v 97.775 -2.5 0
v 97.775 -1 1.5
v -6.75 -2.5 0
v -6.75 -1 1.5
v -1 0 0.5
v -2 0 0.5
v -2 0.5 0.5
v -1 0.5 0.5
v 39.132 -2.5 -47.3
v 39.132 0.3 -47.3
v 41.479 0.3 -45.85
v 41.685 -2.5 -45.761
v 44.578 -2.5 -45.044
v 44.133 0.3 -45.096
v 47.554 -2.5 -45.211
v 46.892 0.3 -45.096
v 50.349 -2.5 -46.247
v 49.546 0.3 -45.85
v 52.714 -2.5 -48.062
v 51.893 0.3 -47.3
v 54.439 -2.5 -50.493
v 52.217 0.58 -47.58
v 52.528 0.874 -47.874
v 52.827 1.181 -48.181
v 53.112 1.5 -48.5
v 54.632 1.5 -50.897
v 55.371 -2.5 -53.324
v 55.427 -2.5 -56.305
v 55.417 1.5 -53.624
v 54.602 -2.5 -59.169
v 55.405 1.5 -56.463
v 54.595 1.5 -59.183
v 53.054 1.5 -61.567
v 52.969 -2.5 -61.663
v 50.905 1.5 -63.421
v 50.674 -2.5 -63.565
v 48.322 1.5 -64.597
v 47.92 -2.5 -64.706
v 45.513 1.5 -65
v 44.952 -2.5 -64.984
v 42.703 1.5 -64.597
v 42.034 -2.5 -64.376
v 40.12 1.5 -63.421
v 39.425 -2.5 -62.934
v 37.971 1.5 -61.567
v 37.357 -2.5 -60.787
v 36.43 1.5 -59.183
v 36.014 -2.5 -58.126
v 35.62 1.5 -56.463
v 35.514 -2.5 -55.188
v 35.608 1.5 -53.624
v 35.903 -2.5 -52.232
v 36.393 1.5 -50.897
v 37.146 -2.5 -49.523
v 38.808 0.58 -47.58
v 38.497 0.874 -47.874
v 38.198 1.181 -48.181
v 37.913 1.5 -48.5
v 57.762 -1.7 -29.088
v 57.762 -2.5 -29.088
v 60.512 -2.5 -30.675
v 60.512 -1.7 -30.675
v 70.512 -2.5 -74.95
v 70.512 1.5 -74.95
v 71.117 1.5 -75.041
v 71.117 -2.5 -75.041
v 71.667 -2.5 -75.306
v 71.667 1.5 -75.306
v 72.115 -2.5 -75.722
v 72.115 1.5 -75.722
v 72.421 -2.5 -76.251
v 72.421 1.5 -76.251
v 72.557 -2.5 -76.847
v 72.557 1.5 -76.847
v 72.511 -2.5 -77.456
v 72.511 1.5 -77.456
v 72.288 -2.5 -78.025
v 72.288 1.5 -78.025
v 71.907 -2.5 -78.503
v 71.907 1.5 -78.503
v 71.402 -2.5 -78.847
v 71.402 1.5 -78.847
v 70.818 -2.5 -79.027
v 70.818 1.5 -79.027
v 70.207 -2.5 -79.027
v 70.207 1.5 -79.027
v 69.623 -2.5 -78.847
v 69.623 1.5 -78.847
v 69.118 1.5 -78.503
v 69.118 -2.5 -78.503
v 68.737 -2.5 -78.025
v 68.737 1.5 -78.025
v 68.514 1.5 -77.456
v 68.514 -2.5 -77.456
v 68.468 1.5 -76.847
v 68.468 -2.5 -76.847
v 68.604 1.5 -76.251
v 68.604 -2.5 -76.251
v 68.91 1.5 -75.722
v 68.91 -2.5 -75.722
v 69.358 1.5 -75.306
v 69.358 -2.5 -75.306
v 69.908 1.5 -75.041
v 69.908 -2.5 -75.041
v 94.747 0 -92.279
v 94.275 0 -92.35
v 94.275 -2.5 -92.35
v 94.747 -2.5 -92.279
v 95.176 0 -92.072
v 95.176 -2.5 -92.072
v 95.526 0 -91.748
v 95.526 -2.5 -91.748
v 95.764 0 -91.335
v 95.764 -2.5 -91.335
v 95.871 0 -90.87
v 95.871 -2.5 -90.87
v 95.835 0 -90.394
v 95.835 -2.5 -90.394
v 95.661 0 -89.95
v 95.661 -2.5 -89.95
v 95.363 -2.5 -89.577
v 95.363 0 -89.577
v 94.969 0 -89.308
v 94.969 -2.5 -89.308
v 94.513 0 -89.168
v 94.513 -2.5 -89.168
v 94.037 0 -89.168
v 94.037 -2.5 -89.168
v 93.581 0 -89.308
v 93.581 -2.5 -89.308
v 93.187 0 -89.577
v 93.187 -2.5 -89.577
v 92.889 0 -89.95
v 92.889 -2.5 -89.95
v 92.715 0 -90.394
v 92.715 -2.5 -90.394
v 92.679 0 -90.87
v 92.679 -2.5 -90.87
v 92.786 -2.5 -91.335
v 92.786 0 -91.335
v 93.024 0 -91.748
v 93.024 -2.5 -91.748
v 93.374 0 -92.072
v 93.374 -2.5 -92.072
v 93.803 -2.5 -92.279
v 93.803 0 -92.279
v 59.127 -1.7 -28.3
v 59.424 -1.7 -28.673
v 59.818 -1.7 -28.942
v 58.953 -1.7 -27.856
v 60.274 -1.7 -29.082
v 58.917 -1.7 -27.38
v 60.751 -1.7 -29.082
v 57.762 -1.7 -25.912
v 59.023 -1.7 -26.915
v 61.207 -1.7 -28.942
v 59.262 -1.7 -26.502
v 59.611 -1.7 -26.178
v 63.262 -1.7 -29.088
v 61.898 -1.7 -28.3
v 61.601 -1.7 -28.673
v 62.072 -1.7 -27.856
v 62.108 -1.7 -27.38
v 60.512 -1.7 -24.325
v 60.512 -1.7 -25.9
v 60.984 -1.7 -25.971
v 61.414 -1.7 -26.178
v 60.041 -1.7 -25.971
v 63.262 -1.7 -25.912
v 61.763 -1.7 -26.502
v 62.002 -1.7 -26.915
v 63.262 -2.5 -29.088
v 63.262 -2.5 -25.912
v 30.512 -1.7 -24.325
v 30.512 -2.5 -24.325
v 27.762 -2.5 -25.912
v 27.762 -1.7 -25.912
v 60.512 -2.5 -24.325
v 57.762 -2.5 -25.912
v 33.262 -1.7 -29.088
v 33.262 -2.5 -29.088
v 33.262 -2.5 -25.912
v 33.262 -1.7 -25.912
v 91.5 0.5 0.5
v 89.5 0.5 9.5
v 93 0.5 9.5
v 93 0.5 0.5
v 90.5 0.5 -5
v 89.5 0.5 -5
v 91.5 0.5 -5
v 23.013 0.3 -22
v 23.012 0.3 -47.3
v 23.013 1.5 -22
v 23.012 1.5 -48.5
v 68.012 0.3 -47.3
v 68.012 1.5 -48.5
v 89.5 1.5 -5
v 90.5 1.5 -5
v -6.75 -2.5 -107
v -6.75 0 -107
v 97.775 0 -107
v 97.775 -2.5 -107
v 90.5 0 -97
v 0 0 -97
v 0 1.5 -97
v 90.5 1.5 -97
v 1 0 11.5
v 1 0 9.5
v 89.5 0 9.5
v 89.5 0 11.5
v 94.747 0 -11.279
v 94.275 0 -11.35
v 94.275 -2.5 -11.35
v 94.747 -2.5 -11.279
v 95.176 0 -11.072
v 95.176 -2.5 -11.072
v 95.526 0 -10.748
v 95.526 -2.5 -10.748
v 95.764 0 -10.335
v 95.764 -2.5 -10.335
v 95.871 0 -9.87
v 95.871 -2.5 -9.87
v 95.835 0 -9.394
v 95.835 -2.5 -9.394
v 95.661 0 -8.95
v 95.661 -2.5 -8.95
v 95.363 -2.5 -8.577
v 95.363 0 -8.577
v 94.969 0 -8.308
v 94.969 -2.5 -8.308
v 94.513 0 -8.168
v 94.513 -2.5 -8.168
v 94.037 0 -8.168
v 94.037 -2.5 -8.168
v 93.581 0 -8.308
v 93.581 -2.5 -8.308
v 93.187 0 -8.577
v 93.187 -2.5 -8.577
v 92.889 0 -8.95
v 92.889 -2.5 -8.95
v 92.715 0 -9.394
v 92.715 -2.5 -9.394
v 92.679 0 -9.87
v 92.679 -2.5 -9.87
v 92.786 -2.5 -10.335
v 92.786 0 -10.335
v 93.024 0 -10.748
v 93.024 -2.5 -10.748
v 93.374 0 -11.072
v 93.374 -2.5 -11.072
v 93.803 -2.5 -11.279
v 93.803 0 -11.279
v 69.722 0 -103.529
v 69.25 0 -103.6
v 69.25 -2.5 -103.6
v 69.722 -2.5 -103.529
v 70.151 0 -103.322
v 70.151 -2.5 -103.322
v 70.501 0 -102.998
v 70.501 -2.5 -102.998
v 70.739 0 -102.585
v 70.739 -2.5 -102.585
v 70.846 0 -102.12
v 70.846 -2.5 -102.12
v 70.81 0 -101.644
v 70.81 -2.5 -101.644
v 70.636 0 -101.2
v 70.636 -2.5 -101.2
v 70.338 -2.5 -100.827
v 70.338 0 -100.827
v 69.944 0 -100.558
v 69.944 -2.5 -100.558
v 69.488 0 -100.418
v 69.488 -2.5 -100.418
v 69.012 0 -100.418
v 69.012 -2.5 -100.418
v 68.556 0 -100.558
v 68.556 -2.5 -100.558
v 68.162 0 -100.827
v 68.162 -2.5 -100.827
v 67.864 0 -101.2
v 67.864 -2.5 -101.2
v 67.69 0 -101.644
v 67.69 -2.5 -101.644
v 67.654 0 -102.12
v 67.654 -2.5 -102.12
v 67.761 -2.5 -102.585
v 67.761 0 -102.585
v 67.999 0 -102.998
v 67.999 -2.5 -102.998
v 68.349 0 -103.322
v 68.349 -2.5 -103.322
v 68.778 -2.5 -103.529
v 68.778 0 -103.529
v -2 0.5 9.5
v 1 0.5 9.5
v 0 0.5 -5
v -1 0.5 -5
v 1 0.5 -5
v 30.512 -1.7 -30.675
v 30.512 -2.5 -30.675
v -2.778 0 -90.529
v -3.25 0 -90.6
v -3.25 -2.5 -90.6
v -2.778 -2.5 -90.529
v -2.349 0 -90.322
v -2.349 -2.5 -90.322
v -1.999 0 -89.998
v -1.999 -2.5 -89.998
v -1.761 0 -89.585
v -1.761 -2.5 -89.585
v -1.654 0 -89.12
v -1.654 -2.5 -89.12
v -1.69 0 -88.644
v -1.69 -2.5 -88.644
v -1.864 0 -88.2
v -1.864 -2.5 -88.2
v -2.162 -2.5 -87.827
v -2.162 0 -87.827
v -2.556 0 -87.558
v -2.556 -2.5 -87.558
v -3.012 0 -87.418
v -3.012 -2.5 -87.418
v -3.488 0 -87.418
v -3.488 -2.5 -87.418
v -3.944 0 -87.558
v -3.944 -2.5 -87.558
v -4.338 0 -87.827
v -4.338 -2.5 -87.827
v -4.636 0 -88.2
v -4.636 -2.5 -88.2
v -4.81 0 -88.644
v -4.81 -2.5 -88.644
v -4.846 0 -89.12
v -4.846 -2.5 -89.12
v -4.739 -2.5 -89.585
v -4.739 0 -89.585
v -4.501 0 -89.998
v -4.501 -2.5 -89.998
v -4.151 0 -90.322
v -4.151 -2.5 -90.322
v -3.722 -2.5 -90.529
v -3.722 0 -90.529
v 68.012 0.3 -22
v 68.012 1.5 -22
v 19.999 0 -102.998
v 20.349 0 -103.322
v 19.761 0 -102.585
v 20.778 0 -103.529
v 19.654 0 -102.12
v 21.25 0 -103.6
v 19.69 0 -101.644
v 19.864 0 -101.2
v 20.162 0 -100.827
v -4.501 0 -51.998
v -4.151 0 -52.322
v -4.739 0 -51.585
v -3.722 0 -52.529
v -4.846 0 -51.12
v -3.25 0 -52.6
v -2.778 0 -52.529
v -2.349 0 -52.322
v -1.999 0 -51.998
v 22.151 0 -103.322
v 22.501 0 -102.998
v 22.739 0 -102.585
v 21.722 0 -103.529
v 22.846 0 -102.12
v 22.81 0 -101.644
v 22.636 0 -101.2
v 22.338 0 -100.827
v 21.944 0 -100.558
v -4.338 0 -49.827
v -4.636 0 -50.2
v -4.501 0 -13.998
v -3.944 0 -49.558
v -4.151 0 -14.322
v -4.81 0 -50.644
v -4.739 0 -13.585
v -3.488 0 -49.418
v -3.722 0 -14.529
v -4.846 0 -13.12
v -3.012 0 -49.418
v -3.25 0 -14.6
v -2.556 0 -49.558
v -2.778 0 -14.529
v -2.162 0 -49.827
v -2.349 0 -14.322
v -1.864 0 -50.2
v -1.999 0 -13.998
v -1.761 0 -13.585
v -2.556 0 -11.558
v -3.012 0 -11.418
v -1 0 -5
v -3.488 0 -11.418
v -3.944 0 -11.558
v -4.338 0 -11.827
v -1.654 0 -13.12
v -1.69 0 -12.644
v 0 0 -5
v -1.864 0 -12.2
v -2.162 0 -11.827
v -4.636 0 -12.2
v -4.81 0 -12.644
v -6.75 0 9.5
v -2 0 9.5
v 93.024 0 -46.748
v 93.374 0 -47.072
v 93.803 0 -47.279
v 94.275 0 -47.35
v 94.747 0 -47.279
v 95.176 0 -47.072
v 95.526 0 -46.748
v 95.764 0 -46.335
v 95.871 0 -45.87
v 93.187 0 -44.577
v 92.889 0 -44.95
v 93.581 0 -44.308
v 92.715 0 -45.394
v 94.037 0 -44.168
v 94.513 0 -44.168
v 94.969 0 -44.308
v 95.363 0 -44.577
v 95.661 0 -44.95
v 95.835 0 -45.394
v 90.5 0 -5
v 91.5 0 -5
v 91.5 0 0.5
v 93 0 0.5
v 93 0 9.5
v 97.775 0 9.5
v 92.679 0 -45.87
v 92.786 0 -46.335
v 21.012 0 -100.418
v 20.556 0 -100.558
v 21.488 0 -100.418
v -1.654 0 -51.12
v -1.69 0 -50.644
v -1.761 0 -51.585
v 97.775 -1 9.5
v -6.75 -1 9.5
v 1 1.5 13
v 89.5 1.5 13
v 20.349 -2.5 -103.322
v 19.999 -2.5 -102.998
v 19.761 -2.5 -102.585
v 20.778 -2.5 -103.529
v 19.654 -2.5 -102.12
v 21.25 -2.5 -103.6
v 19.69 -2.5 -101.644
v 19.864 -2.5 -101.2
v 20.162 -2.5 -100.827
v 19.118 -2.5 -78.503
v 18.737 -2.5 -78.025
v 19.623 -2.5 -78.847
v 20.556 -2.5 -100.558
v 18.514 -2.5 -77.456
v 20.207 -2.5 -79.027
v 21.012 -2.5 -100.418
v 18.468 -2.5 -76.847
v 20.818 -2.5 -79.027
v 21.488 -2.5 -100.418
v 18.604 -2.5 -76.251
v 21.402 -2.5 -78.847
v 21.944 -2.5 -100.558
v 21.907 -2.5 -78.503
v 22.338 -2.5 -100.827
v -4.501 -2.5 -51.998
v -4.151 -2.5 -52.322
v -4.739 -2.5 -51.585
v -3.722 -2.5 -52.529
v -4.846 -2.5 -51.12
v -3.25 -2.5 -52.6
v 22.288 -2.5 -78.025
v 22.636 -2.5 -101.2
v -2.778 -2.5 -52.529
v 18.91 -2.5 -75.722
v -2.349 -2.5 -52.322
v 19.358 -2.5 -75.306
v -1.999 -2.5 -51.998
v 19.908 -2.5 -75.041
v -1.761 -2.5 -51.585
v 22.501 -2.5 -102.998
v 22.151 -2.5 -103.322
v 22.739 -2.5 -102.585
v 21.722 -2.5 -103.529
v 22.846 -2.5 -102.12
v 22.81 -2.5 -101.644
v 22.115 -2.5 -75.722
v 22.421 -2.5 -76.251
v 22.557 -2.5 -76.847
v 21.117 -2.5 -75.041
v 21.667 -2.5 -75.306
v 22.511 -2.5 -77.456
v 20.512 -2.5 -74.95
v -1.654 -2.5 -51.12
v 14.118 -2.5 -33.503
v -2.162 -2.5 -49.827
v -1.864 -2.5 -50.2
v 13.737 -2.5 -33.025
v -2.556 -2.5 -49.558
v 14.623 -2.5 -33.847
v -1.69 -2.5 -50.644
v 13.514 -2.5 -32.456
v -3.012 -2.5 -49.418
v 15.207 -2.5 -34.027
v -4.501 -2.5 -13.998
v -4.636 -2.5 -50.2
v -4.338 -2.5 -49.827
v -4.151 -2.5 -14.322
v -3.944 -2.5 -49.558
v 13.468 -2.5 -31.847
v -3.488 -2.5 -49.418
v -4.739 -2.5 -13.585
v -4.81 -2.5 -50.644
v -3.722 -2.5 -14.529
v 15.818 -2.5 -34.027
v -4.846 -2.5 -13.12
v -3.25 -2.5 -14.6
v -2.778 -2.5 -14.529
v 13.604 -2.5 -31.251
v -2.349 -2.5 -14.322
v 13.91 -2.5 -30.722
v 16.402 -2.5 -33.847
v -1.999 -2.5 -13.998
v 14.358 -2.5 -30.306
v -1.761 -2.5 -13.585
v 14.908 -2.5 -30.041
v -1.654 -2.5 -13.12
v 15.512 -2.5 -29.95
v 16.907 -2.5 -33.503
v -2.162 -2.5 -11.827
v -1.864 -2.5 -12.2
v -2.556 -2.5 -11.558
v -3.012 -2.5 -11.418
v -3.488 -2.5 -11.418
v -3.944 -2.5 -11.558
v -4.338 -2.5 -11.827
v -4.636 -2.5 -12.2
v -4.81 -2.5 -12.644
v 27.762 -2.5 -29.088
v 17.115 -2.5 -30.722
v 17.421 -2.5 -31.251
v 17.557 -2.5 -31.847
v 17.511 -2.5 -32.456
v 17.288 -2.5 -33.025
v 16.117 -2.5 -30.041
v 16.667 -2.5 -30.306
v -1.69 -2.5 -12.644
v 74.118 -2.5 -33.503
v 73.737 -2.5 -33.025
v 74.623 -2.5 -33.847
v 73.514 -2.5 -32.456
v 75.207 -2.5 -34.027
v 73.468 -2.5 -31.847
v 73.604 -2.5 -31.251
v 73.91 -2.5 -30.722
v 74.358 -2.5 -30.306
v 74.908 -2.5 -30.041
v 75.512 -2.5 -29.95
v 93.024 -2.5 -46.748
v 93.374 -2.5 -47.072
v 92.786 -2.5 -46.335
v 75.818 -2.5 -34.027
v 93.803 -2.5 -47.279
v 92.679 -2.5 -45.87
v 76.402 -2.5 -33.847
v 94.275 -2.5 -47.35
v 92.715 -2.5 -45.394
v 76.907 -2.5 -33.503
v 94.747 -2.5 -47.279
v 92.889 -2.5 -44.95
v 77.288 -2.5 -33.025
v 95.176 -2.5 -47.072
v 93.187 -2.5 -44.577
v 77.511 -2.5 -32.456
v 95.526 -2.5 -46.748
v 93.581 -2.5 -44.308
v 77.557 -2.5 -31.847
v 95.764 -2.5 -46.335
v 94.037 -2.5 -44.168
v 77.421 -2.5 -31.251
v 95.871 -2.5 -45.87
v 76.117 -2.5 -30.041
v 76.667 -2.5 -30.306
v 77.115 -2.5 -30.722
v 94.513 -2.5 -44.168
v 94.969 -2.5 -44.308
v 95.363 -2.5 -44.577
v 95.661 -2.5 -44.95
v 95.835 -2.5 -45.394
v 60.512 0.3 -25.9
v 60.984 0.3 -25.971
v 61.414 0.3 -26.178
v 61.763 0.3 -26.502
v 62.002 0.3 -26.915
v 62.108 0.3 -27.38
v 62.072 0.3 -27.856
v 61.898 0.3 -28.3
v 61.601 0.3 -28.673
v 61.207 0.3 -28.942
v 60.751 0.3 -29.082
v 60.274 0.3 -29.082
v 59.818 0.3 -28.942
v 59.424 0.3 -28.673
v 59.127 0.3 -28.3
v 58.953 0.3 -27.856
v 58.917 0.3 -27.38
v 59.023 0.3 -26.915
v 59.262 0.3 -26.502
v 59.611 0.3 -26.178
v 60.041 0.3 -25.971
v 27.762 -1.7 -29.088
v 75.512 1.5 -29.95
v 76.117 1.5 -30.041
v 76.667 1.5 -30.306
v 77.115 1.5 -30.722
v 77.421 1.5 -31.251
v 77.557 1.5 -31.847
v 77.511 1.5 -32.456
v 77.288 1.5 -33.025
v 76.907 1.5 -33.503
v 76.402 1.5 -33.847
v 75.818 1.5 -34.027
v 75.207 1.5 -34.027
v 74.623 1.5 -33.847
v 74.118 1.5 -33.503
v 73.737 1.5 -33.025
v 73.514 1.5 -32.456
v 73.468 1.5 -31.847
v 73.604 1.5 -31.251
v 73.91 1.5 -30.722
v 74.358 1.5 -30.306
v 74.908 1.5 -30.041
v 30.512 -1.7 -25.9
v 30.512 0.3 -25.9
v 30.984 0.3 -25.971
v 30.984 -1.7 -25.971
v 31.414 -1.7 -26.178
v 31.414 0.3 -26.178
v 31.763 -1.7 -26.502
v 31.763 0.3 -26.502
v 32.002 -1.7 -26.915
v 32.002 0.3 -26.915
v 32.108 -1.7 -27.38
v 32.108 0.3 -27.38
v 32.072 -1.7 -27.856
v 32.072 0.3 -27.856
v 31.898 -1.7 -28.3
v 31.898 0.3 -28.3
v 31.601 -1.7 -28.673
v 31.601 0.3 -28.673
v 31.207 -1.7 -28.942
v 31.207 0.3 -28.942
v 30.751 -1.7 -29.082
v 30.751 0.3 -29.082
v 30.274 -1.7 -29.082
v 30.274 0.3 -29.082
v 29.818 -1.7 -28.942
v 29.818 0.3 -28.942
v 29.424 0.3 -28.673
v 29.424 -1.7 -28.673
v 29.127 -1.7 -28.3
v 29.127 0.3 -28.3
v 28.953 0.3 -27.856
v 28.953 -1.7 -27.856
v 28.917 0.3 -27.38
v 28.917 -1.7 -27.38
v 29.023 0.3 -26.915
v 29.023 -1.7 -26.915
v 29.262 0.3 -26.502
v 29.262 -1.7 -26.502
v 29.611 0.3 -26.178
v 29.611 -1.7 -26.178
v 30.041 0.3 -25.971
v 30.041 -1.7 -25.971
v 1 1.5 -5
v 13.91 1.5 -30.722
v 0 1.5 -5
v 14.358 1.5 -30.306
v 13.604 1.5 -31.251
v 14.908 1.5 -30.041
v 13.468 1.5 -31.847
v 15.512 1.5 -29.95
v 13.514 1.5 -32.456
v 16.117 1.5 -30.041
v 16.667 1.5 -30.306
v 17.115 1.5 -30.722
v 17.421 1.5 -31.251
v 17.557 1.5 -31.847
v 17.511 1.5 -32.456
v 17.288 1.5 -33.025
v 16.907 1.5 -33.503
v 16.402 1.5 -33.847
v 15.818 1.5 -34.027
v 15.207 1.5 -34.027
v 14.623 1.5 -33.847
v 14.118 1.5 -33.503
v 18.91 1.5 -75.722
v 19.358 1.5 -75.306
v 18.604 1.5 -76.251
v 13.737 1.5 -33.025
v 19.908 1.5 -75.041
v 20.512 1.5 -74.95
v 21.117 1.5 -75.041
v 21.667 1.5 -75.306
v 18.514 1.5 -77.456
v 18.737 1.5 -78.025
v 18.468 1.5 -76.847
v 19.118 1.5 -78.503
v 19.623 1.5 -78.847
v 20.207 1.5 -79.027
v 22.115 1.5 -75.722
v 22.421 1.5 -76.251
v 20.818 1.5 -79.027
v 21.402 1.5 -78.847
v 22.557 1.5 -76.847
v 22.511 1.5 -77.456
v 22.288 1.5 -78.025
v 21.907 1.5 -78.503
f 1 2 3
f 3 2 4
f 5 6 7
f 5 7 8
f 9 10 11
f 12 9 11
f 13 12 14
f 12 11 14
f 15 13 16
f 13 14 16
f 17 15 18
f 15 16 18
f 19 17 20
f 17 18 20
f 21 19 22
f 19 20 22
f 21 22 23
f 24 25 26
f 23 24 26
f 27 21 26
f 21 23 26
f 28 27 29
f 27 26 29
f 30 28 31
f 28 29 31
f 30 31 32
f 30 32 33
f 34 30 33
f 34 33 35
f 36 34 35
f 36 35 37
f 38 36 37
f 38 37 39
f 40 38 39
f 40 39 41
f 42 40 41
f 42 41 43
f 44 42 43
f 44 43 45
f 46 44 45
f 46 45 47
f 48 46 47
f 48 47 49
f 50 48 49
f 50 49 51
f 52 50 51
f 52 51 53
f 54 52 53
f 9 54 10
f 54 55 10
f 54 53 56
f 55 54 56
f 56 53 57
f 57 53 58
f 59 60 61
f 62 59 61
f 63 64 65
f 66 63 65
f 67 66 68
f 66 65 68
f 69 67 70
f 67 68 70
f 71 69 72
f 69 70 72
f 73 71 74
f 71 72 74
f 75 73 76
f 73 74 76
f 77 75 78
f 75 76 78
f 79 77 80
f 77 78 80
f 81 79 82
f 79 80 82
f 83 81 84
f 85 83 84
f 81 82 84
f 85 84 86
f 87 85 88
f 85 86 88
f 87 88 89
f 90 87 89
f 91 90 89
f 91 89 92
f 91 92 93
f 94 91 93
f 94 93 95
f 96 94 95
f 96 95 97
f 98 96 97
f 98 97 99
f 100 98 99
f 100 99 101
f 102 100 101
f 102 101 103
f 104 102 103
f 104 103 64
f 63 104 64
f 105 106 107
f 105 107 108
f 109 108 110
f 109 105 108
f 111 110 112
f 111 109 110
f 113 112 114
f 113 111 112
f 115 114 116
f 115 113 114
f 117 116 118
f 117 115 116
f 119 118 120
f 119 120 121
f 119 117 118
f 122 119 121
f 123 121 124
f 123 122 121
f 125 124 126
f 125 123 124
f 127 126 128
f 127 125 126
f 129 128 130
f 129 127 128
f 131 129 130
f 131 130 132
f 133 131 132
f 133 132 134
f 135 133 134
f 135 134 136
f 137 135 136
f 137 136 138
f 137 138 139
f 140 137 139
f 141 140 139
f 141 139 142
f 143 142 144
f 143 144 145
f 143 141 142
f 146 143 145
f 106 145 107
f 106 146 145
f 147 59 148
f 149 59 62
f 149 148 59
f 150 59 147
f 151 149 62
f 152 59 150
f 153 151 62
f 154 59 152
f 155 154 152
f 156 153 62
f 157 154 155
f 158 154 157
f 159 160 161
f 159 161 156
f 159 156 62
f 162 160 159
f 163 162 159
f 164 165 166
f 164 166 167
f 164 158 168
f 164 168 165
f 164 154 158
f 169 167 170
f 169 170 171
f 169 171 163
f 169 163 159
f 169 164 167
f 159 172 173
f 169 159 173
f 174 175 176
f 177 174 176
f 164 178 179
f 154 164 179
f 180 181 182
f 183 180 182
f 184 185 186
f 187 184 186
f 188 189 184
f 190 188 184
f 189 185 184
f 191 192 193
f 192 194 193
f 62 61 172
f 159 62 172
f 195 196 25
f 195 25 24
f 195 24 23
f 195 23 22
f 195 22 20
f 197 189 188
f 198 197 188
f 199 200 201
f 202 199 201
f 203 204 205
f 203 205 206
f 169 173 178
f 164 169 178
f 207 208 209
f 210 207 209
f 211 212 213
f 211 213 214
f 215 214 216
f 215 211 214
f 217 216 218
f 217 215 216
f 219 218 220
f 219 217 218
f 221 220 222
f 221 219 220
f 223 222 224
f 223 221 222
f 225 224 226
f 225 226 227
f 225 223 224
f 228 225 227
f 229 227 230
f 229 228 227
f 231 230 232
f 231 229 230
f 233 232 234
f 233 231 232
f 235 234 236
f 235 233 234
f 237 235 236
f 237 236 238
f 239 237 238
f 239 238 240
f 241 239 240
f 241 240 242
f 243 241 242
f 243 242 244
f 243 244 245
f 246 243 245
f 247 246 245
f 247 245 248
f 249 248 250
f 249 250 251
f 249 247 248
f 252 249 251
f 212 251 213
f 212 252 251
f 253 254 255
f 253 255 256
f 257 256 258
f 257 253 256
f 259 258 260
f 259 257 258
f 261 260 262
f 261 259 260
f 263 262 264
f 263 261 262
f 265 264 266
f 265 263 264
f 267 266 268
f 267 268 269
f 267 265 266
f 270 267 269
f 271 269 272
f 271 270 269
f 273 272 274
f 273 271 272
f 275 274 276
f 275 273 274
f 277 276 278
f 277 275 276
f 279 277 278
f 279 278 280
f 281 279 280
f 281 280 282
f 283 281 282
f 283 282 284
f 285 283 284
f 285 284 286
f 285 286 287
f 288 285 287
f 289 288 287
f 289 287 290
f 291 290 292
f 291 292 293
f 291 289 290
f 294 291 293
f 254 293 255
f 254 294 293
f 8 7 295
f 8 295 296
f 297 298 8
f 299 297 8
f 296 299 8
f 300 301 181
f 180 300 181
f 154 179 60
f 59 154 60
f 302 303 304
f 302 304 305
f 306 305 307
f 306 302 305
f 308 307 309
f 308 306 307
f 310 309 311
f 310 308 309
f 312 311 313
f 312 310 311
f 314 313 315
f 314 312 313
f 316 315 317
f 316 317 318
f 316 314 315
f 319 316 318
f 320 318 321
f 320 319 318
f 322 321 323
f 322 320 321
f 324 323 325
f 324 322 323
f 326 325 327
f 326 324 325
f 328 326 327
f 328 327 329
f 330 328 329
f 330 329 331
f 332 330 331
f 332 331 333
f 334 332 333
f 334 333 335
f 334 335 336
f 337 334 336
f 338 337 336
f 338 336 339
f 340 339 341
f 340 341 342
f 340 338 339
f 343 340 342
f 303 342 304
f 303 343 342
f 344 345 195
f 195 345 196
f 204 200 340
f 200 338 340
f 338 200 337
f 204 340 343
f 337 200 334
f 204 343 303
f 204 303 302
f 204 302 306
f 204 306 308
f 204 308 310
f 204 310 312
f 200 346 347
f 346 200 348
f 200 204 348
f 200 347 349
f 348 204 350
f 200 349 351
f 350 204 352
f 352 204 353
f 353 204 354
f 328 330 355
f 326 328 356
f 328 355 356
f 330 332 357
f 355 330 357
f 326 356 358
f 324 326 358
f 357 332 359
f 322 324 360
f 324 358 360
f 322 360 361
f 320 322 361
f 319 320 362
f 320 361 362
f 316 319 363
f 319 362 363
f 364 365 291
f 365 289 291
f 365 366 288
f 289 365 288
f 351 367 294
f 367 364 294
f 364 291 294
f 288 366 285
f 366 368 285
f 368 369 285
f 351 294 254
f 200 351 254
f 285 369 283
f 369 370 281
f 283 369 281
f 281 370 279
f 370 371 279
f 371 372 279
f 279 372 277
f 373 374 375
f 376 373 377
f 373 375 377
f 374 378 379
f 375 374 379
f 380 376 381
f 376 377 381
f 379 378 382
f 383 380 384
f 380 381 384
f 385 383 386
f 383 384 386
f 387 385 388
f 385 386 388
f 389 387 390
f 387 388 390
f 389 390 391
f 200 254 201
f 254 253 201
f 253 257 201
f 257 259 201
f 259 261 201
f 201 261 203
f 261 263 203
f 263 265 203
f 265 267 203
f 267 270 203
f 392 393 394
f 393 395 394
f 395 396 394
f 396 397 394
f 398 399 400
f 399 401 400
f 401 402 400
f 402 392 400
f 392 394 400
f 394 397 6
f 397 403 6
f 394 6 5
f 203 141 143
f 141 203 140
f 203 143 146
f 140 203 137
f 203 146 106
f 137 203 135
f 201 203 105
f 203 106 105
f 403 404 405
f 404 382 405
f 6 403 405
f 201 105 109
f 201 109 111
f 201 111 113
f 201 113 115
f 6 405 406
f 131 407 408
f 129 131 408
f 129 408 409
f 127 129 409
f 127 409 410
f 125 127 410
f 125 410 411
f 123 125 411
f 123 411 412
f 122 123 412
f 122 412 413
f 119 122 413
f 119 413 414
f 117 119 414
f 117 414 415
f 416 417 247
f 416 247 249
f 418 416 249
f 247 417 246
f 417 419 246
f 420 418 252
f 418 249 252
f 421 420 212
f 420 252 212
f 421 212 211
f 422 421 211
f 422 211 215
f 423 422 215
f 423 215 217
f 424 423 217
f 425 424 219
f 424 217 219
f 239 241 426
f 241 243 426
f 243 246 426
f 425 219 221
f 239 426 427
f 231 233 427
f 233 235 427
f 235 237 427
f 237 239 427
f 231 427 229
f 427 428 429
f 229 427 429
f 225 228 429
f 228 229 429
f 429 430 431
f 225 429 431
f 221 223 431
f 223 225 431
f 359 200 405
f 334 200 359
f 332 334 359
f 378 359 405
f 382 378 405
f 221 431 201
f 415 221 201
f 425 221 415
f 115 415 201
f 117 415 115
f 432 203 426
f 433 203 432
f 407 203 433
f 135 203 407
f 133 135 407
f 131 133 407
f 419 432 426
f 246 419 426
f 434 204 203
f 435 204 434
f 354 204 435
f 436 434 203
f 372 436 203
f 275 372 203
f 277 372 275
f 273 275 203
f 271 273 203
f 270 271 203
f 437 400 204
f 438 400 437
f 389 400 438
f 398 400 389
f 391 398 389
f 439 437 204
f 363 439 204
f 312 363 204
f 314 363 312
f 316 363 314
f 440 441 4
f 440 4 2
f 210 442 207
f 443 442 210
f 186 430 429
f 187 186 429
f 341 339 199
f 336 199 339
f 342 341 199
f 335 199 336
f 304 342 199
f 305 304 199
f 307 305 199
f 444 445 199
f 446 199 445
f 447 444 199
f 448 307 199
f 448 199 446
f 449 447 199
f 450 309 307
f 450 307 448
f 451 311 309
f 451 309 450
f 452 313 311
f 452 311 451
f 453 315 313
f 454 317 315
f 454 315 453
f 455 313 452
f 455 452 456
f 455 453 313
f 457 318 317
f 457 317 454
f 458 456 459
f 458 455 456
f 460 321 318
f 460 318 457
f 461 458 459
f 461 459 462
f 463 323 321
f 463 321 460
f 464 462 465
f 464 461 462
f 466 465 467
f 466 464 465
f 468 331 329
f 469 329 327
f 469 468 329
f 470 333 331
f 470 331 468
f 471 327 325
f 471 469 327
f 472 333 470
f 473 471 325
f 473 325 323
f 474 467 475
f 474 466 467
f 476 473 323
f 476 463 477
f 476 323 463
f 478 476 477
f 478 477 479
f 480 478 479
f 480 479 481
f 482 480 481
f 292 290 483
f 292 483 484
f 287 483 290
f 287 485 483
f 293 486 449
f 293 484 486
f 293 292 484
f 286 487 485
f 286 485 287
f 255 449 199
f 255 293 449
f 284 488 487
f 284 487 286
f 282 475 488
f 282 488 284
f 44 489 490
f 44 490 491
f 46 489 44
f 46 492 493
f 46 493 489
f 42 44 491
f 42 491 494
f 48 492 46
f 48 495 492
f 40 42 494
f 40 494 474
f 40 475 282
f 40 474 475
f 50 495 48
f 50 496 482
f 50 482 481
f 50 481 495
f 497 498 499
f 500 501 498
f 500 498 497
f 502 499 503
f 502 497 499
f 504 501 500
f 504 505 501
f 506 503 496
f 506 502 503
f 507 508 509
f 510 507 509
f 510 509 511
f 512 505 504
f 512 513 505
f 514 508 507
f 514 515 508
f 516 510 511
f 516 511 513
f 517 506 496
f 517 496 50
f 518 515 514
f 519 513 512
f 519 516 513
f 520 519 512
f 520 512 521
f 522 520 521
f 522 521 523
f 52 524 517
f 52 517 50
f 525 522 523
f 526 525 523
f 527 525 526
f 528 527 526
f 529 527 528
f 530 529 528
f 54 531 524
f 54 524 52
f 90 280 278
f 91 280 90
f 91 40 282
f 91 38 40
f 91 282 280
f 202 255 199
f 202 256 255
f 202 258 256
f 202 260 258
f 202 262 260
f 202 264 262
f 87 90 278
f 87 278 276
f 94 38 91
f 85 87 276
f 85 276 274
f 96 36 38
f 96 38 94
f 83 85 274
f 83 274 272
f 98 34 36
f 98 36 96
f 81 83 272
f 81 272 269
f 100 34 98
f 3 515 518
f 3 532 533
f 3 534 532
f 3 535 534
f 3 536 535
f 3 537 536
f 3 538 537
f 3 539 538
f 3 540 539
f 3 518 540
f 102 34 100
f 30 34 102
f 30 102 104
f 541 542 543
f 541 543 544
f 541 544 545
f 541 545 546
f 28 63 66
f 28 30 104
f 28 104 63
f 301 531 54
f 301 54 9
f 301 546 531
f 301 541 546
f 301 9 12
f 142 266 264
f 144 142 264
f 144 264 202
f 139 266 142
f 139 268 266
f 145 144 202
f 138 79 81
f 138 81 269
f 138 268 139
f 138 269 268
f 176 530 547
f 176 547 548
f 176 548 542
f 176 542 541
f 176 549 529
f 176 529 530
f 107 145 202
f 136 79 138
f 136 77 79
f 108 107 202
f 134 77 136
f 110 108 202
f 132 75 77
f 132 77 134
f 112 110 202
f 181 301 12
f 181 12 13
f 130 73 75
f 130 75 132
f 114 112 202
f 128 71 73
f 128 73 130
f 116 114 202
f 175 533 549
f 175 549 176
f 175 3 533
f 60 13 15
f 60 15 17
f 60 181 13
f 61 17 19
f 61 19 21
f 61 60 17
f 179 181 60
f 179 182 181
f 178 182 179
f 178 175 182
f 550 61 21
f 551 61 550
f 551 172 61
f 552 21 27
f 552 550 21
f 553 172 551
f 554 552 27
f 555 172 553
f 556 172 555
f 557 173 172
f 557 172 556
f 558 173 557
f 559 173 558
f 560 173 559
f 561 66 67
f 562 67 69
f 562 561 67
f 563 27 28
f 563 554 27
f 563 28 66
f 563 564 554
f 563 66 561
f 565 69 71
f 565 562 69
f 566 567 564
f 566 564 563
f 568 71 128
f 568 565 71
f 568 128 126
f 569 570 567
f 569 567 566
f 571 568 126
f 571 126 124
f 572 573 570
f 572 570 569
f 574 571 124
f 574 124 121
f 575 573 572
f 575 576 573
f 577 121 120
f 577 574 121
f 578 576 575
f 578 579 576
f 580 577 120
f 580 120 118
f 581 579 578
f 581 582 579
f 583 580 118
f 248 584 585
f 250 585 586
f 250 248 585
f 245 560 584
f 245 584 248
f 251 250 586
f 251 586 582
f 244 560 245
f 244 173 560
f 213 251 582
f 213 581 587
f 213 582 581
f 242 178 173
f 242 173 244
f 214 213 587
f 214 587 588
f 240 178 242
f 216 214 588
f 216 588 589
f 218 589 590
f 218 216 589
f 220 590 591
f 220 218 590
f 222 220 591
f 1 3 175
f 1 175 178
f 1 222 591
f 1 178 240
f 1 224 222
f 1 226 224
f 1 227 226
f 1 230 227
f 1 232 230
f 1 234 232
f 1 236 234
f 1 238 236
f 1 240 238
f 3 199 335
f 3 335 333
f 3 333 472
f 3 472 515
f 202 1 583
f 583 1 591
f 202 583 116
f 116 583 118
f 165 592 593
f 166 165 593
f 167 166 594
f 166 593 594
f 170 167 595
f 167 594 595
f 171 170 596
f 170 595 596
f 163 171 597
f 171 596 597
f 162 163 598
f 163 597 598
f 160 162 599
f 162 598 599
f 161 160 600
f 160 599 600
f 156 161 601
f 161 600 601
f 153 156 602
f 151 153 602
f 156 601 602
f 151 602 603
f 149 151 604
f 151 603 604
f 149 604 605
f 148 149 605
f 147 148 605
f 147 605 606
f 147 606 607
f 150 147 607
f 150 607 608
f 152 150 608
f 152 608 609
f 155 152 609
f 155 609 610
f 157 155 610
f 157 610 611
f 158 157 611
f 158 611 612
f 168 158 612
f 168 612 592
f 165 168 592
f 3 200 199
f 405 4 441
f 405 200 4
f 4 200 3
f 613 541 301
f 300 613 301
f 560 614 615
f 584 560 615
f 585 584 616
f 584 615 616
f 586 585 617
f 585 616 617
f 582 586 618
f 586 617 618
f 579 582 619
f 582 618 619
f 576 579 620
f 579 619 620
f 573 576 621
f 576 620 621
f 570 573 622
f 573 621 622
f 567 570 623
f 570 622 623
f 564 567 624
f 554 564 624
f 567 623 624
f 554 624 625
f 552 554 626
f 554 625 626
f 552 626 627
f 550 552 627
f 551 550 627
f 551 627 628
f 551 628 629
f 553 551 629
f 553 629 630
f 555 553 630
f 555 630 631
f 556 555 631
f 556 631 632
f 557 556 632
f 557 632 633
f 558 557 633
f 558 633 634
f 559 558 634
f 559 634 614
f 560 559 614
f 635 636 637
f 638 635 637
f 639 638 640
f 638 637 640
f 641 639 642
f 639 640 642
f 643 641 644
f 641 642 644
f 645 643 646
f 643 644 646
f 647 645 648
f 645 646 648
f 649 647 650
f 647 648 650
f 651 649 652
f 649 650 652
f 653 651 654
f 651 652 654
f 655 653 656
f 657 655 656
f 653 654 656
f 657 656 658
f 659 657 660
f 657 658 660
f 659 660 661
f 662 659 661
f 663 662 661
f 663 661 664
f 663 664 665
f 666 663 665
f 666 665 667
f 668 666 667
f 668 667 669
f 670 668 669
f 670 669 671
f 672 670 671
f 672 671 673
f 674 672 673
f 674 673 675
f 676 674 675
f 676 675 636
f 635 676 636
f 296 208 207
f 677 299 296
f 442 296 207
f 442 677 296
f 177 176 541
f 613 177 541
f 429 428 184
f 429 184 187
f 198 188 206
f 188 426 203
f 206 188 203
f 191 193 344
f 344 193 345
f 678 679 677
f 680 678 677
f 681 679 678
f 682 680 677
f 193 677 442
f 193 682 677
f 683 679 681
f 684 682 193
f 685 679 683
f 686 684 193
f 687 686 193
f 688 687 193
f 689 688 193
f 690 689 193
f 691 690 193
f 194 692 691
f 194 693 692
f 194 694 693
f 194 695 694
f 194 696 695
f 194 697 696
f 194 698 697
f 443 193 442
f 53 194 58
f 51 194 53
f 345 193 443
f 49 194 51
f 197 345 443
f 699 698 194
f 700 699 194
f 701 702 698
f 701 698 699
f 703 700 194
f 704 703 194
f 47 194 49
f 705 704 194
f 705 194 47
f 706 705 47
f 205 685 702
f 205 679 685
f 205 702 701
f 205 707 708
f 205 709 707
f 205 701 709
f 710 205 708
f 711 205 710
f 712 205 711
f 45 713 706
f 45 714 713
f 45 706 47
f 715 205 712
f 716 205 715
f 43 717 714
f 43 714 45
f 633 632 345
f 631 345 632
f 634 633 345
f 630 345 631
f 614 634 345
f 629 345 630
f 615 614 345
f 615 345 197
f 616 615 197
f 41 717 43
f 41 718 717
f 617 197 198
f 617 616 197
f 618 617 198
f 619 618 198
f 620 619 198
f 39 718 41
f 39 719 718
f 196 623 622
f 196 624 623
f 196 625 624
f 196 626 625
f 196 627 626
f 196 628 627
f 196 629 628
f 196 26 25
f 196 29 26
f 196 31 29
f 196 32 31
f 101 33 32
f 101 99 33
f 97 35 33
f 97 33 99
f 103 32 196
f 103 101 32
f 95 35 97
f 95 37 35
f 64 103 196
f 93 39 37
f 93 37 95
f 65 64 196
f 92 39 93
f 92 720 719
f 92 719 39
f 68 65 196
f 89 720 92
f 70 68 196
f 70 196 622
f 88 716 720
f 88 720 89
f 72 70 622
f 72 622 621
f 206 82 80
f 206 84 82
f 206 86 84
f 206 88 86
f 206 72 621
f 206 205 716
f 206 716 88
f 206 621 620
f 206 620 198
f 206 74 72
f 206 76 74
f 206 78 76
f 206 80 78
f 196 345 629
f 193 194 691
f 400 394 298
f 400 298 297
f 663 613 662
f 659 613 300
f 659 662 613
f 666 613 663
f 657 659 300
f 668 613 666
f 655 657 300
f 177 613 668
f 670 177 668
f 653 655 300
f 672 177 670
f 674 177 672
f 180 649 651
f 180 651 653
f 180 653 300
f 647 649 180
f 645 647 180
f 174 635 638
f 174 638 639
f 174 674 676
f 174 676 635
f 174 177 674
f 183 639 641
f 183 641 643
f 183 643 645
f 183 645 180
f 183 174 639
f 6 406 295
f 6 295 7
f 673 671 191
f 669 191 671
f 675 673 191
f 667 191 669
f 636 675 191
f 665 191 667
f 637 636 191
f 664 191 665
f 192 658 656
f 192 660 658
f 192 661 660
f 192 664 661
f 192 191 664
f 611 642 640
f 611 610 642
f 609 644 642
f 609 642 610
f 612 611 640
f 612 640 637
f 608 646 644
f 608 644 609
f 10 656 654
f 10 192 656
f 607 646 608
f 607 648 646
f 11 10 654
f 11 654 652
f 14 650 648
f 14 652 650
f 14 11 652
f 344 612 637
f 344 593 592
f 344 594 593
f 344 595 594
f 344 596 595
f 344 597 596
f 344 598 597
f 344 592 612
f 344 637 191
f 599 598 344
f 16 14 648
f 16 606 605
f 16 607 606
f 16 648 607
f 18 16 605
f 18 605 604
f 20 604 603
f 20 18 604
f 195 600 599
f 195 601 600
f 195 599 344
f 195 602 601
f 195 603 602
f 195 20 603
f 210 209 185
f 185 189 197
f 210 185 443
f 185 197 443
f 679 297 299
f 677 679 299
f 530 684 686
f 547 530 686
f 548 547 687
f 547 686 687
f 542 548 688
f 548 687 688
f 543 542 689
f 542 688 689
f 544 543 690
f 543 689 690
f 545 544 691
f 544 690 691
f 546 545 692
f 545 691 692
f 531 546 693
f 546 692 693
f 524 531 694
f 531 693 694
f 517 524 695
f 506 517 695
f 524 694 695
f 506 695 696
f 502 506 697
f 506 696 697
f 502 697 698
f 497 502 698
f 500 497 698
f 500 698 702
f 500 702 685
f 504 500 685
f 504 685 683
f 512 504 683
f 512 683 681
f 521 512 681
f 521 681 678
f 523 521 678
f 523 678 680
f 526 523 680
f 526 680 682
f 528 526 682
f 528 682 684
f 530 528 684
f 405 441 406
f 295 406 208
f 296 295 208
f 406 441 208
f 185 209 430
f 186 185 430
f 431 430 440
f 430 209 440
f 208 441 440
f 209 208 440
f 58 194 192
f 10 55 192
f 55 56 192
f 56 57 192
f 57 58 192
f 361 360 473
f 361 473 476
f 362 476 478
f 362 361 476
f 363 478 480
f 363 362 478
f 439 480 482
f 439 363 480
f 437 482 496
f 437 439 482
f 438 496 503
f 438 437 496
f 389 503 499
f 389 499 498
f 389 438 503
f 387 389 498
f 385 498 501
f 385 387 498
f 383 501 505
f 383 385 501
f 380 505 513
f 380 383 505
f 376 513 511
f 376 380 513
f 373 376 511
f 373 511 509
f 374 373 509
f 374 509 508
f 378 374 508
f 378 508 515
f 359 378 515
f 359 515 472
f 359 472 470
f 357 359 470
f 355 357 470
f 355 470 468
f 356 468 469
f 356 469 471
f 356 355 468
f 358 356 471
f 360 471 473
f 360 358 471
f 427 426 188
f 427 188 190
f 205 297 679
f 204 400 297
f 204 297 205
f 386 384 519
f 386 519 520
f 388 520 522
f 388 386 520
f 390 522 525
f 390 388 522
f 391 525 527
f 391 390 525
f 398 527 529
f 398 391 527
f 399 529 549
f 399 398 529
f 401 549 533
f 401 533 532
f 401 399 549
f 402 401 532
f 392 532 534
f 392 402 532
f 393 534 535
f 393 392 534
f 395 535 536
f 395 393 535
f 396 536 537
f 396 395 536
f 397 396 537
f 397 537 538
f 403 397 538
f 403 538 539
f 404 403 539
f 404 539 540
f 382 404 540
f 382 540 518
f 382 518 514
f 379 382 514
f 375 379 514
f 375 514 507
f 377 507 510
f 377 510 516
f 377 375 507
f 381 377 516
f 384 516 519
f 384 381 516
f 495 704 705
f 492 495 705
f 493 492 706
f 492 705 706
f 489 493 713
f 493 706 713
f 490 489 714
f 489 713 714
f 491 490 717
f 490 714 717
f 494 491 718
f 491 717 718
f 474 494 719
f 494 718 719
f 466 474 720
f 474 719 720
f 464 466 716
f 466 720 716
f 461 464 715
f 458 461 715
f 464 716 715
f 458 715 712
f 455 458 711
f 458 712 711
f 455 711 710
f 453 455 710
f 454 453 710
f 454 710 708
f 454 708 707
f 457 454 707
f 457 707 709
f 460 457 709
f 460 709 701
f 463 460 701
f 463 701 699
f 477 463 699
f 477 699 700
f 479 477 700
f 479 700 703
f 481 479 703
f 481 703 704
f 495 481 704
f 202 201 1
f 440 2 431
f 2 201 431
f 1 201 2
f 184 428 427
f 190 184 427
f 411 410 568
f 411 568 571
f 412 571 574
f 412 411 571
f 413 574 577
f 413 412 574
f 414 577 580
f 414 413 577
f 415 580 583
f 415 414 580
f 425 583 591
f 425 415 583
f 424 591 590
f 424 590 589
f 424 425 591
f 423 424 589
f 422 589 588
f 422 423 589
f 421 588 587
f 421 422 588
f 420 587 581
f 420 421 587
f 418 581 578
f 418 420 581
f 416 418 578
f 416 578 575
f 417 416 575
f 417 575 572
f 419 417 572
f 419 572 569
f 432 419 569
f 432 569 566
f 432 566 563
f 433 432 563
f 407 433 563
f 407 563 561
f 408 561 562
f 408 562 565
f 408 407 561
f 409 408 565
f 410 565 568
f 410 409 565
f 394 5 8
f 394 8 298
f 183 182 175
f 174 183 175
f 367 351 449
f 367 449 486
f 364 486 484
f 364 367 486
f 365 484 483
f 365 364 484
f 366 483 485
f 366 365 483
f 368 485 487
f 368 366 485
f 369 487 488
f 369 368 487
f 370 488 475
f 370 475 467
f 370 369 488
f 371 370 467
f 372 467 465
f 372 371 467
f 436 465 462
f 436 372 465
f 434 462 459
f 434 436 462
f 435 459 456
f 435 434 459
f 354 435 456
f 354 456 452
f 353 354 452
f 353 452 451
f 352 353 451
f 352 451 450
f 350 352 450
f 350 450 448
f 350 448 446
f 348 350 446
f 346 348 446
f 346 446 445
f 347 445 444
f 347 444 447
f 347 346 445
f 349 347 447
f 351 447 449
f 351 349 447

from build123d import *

# Parameters (mm, degrees)
SKETCH_1_W          = 90.5
SKETCH_1_H          = 97
EXTRUDE_1_DEPTH     = 2
SKETCH_2_W          = 104.525
SKETCH_2_H          = 124
SKETCH_2_R          = 1.6
EXTRUDE_2_DEPTH     = 2.5
SKETCH_3_W          = 88.5
SKETCH_3_H          = 17
EXTRUDE_3_DEPTH     = 2
SKETCH_4_W          = 1
SKETCH_4_H          = 5
CUT_EXTRUDE_1_DEPTH = 2
CUT_EXTRUDE_2_DEPTH = 150.601890446
SKETCH_6_W          = 45
SKETCH_6_H          = 25
CUT_EXTRUDE_3_DEPTH = 1.7
CUT_EXTRUDE_4_REACH = 146.972
SKETCH_7_R          = 1.6
CHAMFER_1_SIZE      = 2
CUT_EXTRUDE_5_REACH = 147.014
SKETCH_8_R          = 2.05
CUT_EXTRUDE_6_REACH = 147.014
SKETCH_9_R          = 10
CUT_EXTRUDE_7_DEPTH = 0.8
CUT_EXTRUDE_8_REACH = 151.602
SKETCH_11_W         = 6.5
SKETCH_11_H         = 2.5
CHAMFER_2_SIZE      = 2
SKETCH_12_W         = 104.525
SKETCH_12_H         = 9.5
EXTRUDE_4_DEPTH     = 1
SKETCH_13_W         = 2
SKETCH_13_H         = 14.5
EXTRUDE_5_DEPTH     = 0.5
SKETCH_14_W         = 1.5
SKETCH_14_H         = 9
SKETCH_14_W_2       = 1
EXTRUDE_6_DEPTH     = 0.5
SKETCH_15_W         = 88.5
SKETCH_15_H         = 2.828427125
EXTRUDE_7_DEPTH     = 2
CUT_EXTRUDE_9_DEPTH = 0.5


with BuildPart() as part:
    # 草图1 → 凸台-拉伸1 (new body)
    with BuildSketch(Plane(origin=(0, 0, 0), x_dir=(1, 0, 0), z_dir=(0, 1, 0))):
        with Locations((45.25, 48.5)):
            Rectangle(SKETCH_1_W, SKETCH_1_H)
    extrude(amount=EXTRUDE_1_DEPTH)

    # 草图2 → 凸台-拉伸2 (add)
    with BuildSketch(Plane.XZ):
        with Locations((45.5125, -45)):
            Rectangle(SKETCH_2_W, SKETCH_2_H)
        with Locations(Location((21.25, -102, 0), (0, 0, 270))):
            Circle(SKETCH_2_R, mode=Mode.SUBTRACT)
        with Locations(Location((69.25, -102, 0), (0, 0, 270))):
            Circle(SKETCH_2_R, mode=Mode.SUBTRACT)
        with Locations(Location((-3.25, -89, 0), (0, 0, 270))):
            Circle(SKETCH_2_R, mode=Mode.SUBTRACT)
        with Locations(Location((94.275, -90.75, 0), (0, 0, 270))):
            Circle(SKETCH_2_R, mode=Mode.SUBTRACT)
        with Locations(Location((-3.25, -13, 0), (0, 0, 270))):
            Circle(SKETCH_2_R, mode=Mode.SUBTRACT)
        with Locations(Location((-3.25, -51, 0), (0, 0, 270))):
            Circle(SKETCH_2_R, mode=Mode.SUBTRACT)
        with Locations(Location((94.275, -9.75, 0), (0, 0, 270))):
            Circle(SKETCH_2_R, mode=Mode.SUBTRACT)
        with Locations(Location((94.275, -45.75, 0), (0, 0, 270))):
            Circle(SKETCH_2_R, mode=Mode.SUBTRACT)
    extrude(amount=EXTRUDE_2_DEPTH)

    # 草图3 → 凸台-拉伸3 (add)
    with BuildSketch(Plane(origin=(0, 0, 0), x_dir=(1, 0, 0), z_dir=(0, 1, 0))):
        with Locations((45.25, -8.5)):
            Rectangle(SKETCH_3_W, SKETCH_3_H)
    extrude(amount=EXTRUDE_3_DEPTH)

    # 草图4 → 切除-拉伸1 (cut)
    with BuildSketch(Plane(origin=(0, 0, 0), x_dir=(1, 0, 0), z_dir=(0, 1, 0))):
        with Locations((0.5, 2.5)):
            Rectangle(SKETCH_4_W, SKETCH_4_H)
        with Locations((90, 2.5)):
            Rectangle(SKETCH_4_W, SKETCH_4_H)
    extrude(amount=CUT_EXTRUDE_1_DEPTH, mode=Mode.SUBTRACT)

    # 草图5 → 切除-拉伸2 (cut, through all)
    with BuildSketch(Plane(origin=(97.775, 0, 0), x_dir=(0, 0, -1), z_dir=(1, 0, 0))):
        Polygon((-8.5, -2.5), (-8.5, 0), (-9.5, 0), (-11.5, 2), (-17, 2), (-17, -2.5), align=None)
    extrude(amount=-CUT_EXTRUDE_2_DEPTH, mode=Mode.SUBTRACT)

    # 草图6 → 切除-拉伸3 (cut)
    with BuildSketch(Plane(origin=(0, 2, 0), x_dir=(1, 0, 0), z_dir=(0, 1, 0))):
        with Locations((45.5125, 34.5)):
            Rectangle(SKETCH_6_W, SKETCH_6_H)
    extrude(amount=-CUT_EXTRUDE_3_DEPTH, mode=Mode.SUBTRACT)

    # 草图7 → 切除-拉伸4 (cut, up to next)
    with BuildSketch(Plane(origin=(0, 0.3, 0), x_dir=(1, 0, 0), z_dir=(0, 1, 0)), mode=Mode.PRIVATE) as cut_extrude_4_sk1:
        with Locations(Location((30.5125, 27.5, 0), (0, 0, 270))):
            Circle(SKETCH_7_R)
    cut_extrude_4_tool1 = extrude(cut_extrude_4_sk1.sketch, amount=-CUT_EXTRUDE_4_REACH, mode=Mode.PRIVATE) & part.part
    # 草图7 → 切除-拉伸4 (cut, up to next)
    with BuildSketch(Plane(origin=(0, 0.3, 0), x_dir=(1, 0, 0), z_dir=(0, 1, 0)), mode=Mode.PRIVATE) as cut_extrude_4_sk2:
        with Locations(Location((60.5125, 27.5, 0), (0, 0, 270))):
            Circle(SKETCH_7_R)
    cut_extrude_4_tool2 = extrude(cut_extrude_4_sk2.sketch, amount=-CUT_EXTRUDE_4_REACH, mode=Mode.PRIVATE) & part.part
    add(cut_extrude_4_tool1.solids().sort_by_distance((30.5125, 0.3, -27.5))[0], mode=Mode.SUBTRACT)
    add(cut_extrude_4_tool2.solids().sort_by_distance((60.5125, 0.3, -27.5))[0], mode=Mode.SUBTRACT)

    # 倒角1
    # the kernel refuses this chamfer: 2 mm, written as the material it adds along each edge
    # the kernel refuses this chamfer: 2 mm, written as the material it takes off along each edge
    with BuildSketch(Plane(origin=(23.0125, 2, -47), x_dir=(0, 0.027495876610586296, -0.9996219169112968), z_dir=(1, 0, 0))) as chamfer_1_2_piece_1_section:
        Polygon((CHAMFER_1_SIZE * 0.999621916911, -CHAMFER_1_SIZE * 0.0274958766106), (-CHAMFER_1_SIZE * 0.0274958766106, -CHAMFER_1_SIZE * 0.999621916911), (0, 0), align=None)
    chamfer_1_2_piece_1 = extrude(amount=45, mode=Mode.PRIVATE)
    chamfer_1_2_piece_1 = split(chamfer_1_2_piece_1, bisect_by=Plane(origin=(45.5125, 0.3, -47.679710145), z_dir=(0, 1, 0)), keep=Keep.TOP, mode=Mode.PRIVATE)
    add(chamfer_1_2_piece_1, mode=Mode.SUBTRACT)

    # 草图8 → 切除-拉伸5 (cut, up to next)
    with BuildSketch(Plane(origin=(0, 2, 0), x_dir=(1, 0, 0), z_dir=(0, 1, 0)), mode=Mode.PRIVATE) as cut_extrude_5_sk1:
        with Locations(Location((20.5125, 77, 0), (0, 0, 270))):
            Circle(SKETCH_8_R)
    cut_extrude_5_tool1 = extrude(cut_extrude_5_sk1.sketch, amount=-CUT_EXTRUDE_5_REACH, mode=Mode.PRIVATE) & part.part
    # 草图8 → 切除-拉伸5 (cut, up to next)
    with BuildSketch(Plane(origin=(0, 2, 0), x_dir=(1, 0, 0), z_dir=(0, 1, 0)), mode=Mode.PRIVATE) as cut_extrude_5_sk2:
        with Locations(Location((70.5125, 77, 0), (0, 0, 270))):
            Circle(SKETCH_8_R)
    cut_extrude_5_tool2 = extrude(cut_extrude_5_sk2.sketch, amount=-CUT_EXTRUDE_5_REACH, mode=Mode.PRIVATE) & part.part
    # 草图8 → 切除-拉伸5 (cut, up to next)
    with BuildSketch(Plane(origin=(0, 2, 0), x_dir=(1, 0, 0), z_dir=(0, 1, 0)), mode=Mode.PRIVATE) as cut_extrude_5_sk3:
        with Locations(Location((15.5125, 32, 0), (0, 0, 270))):
            Circle(SKETCH_8_R)
    cut_extrude_5_tool3 = extrude(cut_extrude_5_sk3.sketch, amount=-CUT_EXTRUDE_5_REACH, mode=Mode.PRIVATE) & part.part
    # 草图8 → 切除-拉伸5 (cut, up to next)
    with BuildSketch(Plane(origin=(0, 2, 0), x_dir=(1, 0, 0), z_dir=(0, 1, 0)), mode=Mode.PRIVATE) as cut_extrude_5_sk4:
        with Locations(Location((75.5125, 32, 0), (0, 0, 270))):
            Circle(SKETCH_8_R)
    cut_extrude_5_tool4 = extrude(cut_extrude_5_sk4.sketch, amount=-CUT_EXTRUDE_5_REACH, mode=Mode.PRIVATE) & part.part
    add(cut_extrude_5_tool1.solids().sort_by_distance((20.5125, 2, -77))[0], mode=Mode.SUBTRACT)
    add(cut_extrude_5_tool2.solids().sort_by_distance((70.5125, 2, -77))[0], mode=Mode.SUBTRACT)
    add(cut_extrude_5_tool3.solids().sort_by_distance((15.5125, 2, -32))[0], mode=Mode.SUBTRACT)
    add(cut_extrude_5_tool4.solids().sort_by_distance((75.5125, 2, -32))[0], mode=Mode.SUBTRACT)

    # 草图9 → 切除-拉伸6 (cut, up to next)
    with BuildSketch(Plane(origin=(0, 2, 0), x_dir=(1, 0, 0), z_dir=(0, 1, 0)), mode=Mode.PRIVATE) as cut_extrude_6_sk1:
        with Locations(Location((45.5125, 55, 0), (0, 0, 230.353888853))):
            Circle(SKETCH_9_R)
    cut_extrude_6_tool1 = extrude(cut_extrude_6_sk1.sketch, amount=-CUT_EXTRUDE_6_REACH, mode=Mode.PRIVATE) & part.part
    add(cut_extrude_6_tool1.solids().sort_by_distance((45.5125, 2, -55))[0], mode=Mode.SUBTRACT)

    # 草图10 → 切除-拉伸7 (cut)
    with BuildSketch(Plane.XZ.offset(2.5)):
        Polygon((27.7625, -25.91228676), (27.7625, -29.08771324), (30.5125, -30.675426481), (33.2625, -29.08771324), (33.2625, -25.91228676), (30.5125, -24.324573519), align=None)
        Polygon((57.7625, -25.91228676), (57.7625, -29.08771324), (60.5125, -30.675426481), (63.2625, -29.08771324), (63.2625, -25.91228676), (60.5125, -24.324573519), align=None)
    extrude(amount=-CUT_EXTRUDE_7_DEPTH, mode=Mode.SUBTRACT)

    # 草图11 → 切除-拉伸8 (cut, up to next)
    with BuildSketch(Plane(origin=(97.775, 0, 0), x_dir=(0, 0, -1), z_dir=(1, 0, 0)), mode=Mode.PRIVATE) as cut_extrude_8_sk1:
        with Locations((-5.25, -1.25)):
            Rectangle(SKETCH_11_W, SKETCH_11_H)
    cut_extrude_8_tool1 = extrude(cut_extrude_8_sk1.sketch, amount=-CUT_EXTRUDE_8_REACH, mode=Mode.PRIVATE) & part.part
    add(cut_extrude_8_tool1.solids().sort_by_distance((97.775, -1.25, 5.25))[0], mode=Mode.SUBTRACT)

    # 倒角2
    chamfer_2_edges = [part.edges().sort_by_distance(p)[0] for p in [
        (45.5125, -2.5, 2),
    ]]
    chamfer(chamfer_2_edges, length=CHAMFER_2_SIZE)

    # 草图12 → 凸台-拉伸4 (add)
    with BuildSketch(Plane.XZ):
        with Locations((45.5125, 4.75)):
            Rectangle(SKETCH_12_W, SKETCH_12_H)
    extrude(amount=EXTRUDE_4_DEPTH)

    # 草图13 → 凸台-拉伸5 (add)
    with BuildSketch(Plane(origin=(0, 0, 0), x_dir=(1, 0, 0), z_dir=(0, 1, 0))):
        with Locations((0, -2.25)):
            Rectangle(SKETCH_13_W, SKETCH_13_H)
        with Locations((90.5, -2.25)):
            Rectangle(SKETCH_13_W, SKETCH_13_H)
    extrude(amount=EXTRUDE_5_DEPTH)

    # 草图14 → 凸台-拉伸6 (add)
    with BuildSketch(Plane(origin=(0, 0, 0), x_dir=(1, 0, 0), z_dir=(0, 1, 0))):
        with Locations((92.25, -5)):
            Rectangle(SKETCH_14_W, SKETCH_14_H)
        with Locations((-1.5, -5)):
            Rectangle(SKETCH_14_W_2, SKETCH_14_H)
    extrude(amount=EXTRUDE_6_DEPTH)

    # 草图15 → 凸台-拉伸7 (add, along a direction that is not the sketch's normal)
    with BuildSketch(Plane(origin=(0, -4.75, 4.75), x_dir=(1, 0, 0), z_dir=(0, -0.7071067811865501, 0.7071067811865449))):
        with Locations((45.25, 8.131727983)):
            Rectangle(SKETCH_15_W, SKETCH_15_H)
    extrude(amount=EXTRUDE_7_DEPTH, dir=(0, 0, 1))

    # 草图16 → 切除-拉伸9 (cut)
    with BuildSketch(Plane(origin=(0, 2, 0), x_dir=(1, 0, 0), z_dir=(0, 1, 0))):
        Polygon((1, 5), (1, -13.5), (89.5, -13.5), (89.5, 5), (90.5, 5), (90.5, 97), (0, 97), (0, 5), align=None)
    extrude(amount=-CUT_EXTRUDE_9_DEPTH, mode=Mode.SUBTRACT)


solid = part.part
